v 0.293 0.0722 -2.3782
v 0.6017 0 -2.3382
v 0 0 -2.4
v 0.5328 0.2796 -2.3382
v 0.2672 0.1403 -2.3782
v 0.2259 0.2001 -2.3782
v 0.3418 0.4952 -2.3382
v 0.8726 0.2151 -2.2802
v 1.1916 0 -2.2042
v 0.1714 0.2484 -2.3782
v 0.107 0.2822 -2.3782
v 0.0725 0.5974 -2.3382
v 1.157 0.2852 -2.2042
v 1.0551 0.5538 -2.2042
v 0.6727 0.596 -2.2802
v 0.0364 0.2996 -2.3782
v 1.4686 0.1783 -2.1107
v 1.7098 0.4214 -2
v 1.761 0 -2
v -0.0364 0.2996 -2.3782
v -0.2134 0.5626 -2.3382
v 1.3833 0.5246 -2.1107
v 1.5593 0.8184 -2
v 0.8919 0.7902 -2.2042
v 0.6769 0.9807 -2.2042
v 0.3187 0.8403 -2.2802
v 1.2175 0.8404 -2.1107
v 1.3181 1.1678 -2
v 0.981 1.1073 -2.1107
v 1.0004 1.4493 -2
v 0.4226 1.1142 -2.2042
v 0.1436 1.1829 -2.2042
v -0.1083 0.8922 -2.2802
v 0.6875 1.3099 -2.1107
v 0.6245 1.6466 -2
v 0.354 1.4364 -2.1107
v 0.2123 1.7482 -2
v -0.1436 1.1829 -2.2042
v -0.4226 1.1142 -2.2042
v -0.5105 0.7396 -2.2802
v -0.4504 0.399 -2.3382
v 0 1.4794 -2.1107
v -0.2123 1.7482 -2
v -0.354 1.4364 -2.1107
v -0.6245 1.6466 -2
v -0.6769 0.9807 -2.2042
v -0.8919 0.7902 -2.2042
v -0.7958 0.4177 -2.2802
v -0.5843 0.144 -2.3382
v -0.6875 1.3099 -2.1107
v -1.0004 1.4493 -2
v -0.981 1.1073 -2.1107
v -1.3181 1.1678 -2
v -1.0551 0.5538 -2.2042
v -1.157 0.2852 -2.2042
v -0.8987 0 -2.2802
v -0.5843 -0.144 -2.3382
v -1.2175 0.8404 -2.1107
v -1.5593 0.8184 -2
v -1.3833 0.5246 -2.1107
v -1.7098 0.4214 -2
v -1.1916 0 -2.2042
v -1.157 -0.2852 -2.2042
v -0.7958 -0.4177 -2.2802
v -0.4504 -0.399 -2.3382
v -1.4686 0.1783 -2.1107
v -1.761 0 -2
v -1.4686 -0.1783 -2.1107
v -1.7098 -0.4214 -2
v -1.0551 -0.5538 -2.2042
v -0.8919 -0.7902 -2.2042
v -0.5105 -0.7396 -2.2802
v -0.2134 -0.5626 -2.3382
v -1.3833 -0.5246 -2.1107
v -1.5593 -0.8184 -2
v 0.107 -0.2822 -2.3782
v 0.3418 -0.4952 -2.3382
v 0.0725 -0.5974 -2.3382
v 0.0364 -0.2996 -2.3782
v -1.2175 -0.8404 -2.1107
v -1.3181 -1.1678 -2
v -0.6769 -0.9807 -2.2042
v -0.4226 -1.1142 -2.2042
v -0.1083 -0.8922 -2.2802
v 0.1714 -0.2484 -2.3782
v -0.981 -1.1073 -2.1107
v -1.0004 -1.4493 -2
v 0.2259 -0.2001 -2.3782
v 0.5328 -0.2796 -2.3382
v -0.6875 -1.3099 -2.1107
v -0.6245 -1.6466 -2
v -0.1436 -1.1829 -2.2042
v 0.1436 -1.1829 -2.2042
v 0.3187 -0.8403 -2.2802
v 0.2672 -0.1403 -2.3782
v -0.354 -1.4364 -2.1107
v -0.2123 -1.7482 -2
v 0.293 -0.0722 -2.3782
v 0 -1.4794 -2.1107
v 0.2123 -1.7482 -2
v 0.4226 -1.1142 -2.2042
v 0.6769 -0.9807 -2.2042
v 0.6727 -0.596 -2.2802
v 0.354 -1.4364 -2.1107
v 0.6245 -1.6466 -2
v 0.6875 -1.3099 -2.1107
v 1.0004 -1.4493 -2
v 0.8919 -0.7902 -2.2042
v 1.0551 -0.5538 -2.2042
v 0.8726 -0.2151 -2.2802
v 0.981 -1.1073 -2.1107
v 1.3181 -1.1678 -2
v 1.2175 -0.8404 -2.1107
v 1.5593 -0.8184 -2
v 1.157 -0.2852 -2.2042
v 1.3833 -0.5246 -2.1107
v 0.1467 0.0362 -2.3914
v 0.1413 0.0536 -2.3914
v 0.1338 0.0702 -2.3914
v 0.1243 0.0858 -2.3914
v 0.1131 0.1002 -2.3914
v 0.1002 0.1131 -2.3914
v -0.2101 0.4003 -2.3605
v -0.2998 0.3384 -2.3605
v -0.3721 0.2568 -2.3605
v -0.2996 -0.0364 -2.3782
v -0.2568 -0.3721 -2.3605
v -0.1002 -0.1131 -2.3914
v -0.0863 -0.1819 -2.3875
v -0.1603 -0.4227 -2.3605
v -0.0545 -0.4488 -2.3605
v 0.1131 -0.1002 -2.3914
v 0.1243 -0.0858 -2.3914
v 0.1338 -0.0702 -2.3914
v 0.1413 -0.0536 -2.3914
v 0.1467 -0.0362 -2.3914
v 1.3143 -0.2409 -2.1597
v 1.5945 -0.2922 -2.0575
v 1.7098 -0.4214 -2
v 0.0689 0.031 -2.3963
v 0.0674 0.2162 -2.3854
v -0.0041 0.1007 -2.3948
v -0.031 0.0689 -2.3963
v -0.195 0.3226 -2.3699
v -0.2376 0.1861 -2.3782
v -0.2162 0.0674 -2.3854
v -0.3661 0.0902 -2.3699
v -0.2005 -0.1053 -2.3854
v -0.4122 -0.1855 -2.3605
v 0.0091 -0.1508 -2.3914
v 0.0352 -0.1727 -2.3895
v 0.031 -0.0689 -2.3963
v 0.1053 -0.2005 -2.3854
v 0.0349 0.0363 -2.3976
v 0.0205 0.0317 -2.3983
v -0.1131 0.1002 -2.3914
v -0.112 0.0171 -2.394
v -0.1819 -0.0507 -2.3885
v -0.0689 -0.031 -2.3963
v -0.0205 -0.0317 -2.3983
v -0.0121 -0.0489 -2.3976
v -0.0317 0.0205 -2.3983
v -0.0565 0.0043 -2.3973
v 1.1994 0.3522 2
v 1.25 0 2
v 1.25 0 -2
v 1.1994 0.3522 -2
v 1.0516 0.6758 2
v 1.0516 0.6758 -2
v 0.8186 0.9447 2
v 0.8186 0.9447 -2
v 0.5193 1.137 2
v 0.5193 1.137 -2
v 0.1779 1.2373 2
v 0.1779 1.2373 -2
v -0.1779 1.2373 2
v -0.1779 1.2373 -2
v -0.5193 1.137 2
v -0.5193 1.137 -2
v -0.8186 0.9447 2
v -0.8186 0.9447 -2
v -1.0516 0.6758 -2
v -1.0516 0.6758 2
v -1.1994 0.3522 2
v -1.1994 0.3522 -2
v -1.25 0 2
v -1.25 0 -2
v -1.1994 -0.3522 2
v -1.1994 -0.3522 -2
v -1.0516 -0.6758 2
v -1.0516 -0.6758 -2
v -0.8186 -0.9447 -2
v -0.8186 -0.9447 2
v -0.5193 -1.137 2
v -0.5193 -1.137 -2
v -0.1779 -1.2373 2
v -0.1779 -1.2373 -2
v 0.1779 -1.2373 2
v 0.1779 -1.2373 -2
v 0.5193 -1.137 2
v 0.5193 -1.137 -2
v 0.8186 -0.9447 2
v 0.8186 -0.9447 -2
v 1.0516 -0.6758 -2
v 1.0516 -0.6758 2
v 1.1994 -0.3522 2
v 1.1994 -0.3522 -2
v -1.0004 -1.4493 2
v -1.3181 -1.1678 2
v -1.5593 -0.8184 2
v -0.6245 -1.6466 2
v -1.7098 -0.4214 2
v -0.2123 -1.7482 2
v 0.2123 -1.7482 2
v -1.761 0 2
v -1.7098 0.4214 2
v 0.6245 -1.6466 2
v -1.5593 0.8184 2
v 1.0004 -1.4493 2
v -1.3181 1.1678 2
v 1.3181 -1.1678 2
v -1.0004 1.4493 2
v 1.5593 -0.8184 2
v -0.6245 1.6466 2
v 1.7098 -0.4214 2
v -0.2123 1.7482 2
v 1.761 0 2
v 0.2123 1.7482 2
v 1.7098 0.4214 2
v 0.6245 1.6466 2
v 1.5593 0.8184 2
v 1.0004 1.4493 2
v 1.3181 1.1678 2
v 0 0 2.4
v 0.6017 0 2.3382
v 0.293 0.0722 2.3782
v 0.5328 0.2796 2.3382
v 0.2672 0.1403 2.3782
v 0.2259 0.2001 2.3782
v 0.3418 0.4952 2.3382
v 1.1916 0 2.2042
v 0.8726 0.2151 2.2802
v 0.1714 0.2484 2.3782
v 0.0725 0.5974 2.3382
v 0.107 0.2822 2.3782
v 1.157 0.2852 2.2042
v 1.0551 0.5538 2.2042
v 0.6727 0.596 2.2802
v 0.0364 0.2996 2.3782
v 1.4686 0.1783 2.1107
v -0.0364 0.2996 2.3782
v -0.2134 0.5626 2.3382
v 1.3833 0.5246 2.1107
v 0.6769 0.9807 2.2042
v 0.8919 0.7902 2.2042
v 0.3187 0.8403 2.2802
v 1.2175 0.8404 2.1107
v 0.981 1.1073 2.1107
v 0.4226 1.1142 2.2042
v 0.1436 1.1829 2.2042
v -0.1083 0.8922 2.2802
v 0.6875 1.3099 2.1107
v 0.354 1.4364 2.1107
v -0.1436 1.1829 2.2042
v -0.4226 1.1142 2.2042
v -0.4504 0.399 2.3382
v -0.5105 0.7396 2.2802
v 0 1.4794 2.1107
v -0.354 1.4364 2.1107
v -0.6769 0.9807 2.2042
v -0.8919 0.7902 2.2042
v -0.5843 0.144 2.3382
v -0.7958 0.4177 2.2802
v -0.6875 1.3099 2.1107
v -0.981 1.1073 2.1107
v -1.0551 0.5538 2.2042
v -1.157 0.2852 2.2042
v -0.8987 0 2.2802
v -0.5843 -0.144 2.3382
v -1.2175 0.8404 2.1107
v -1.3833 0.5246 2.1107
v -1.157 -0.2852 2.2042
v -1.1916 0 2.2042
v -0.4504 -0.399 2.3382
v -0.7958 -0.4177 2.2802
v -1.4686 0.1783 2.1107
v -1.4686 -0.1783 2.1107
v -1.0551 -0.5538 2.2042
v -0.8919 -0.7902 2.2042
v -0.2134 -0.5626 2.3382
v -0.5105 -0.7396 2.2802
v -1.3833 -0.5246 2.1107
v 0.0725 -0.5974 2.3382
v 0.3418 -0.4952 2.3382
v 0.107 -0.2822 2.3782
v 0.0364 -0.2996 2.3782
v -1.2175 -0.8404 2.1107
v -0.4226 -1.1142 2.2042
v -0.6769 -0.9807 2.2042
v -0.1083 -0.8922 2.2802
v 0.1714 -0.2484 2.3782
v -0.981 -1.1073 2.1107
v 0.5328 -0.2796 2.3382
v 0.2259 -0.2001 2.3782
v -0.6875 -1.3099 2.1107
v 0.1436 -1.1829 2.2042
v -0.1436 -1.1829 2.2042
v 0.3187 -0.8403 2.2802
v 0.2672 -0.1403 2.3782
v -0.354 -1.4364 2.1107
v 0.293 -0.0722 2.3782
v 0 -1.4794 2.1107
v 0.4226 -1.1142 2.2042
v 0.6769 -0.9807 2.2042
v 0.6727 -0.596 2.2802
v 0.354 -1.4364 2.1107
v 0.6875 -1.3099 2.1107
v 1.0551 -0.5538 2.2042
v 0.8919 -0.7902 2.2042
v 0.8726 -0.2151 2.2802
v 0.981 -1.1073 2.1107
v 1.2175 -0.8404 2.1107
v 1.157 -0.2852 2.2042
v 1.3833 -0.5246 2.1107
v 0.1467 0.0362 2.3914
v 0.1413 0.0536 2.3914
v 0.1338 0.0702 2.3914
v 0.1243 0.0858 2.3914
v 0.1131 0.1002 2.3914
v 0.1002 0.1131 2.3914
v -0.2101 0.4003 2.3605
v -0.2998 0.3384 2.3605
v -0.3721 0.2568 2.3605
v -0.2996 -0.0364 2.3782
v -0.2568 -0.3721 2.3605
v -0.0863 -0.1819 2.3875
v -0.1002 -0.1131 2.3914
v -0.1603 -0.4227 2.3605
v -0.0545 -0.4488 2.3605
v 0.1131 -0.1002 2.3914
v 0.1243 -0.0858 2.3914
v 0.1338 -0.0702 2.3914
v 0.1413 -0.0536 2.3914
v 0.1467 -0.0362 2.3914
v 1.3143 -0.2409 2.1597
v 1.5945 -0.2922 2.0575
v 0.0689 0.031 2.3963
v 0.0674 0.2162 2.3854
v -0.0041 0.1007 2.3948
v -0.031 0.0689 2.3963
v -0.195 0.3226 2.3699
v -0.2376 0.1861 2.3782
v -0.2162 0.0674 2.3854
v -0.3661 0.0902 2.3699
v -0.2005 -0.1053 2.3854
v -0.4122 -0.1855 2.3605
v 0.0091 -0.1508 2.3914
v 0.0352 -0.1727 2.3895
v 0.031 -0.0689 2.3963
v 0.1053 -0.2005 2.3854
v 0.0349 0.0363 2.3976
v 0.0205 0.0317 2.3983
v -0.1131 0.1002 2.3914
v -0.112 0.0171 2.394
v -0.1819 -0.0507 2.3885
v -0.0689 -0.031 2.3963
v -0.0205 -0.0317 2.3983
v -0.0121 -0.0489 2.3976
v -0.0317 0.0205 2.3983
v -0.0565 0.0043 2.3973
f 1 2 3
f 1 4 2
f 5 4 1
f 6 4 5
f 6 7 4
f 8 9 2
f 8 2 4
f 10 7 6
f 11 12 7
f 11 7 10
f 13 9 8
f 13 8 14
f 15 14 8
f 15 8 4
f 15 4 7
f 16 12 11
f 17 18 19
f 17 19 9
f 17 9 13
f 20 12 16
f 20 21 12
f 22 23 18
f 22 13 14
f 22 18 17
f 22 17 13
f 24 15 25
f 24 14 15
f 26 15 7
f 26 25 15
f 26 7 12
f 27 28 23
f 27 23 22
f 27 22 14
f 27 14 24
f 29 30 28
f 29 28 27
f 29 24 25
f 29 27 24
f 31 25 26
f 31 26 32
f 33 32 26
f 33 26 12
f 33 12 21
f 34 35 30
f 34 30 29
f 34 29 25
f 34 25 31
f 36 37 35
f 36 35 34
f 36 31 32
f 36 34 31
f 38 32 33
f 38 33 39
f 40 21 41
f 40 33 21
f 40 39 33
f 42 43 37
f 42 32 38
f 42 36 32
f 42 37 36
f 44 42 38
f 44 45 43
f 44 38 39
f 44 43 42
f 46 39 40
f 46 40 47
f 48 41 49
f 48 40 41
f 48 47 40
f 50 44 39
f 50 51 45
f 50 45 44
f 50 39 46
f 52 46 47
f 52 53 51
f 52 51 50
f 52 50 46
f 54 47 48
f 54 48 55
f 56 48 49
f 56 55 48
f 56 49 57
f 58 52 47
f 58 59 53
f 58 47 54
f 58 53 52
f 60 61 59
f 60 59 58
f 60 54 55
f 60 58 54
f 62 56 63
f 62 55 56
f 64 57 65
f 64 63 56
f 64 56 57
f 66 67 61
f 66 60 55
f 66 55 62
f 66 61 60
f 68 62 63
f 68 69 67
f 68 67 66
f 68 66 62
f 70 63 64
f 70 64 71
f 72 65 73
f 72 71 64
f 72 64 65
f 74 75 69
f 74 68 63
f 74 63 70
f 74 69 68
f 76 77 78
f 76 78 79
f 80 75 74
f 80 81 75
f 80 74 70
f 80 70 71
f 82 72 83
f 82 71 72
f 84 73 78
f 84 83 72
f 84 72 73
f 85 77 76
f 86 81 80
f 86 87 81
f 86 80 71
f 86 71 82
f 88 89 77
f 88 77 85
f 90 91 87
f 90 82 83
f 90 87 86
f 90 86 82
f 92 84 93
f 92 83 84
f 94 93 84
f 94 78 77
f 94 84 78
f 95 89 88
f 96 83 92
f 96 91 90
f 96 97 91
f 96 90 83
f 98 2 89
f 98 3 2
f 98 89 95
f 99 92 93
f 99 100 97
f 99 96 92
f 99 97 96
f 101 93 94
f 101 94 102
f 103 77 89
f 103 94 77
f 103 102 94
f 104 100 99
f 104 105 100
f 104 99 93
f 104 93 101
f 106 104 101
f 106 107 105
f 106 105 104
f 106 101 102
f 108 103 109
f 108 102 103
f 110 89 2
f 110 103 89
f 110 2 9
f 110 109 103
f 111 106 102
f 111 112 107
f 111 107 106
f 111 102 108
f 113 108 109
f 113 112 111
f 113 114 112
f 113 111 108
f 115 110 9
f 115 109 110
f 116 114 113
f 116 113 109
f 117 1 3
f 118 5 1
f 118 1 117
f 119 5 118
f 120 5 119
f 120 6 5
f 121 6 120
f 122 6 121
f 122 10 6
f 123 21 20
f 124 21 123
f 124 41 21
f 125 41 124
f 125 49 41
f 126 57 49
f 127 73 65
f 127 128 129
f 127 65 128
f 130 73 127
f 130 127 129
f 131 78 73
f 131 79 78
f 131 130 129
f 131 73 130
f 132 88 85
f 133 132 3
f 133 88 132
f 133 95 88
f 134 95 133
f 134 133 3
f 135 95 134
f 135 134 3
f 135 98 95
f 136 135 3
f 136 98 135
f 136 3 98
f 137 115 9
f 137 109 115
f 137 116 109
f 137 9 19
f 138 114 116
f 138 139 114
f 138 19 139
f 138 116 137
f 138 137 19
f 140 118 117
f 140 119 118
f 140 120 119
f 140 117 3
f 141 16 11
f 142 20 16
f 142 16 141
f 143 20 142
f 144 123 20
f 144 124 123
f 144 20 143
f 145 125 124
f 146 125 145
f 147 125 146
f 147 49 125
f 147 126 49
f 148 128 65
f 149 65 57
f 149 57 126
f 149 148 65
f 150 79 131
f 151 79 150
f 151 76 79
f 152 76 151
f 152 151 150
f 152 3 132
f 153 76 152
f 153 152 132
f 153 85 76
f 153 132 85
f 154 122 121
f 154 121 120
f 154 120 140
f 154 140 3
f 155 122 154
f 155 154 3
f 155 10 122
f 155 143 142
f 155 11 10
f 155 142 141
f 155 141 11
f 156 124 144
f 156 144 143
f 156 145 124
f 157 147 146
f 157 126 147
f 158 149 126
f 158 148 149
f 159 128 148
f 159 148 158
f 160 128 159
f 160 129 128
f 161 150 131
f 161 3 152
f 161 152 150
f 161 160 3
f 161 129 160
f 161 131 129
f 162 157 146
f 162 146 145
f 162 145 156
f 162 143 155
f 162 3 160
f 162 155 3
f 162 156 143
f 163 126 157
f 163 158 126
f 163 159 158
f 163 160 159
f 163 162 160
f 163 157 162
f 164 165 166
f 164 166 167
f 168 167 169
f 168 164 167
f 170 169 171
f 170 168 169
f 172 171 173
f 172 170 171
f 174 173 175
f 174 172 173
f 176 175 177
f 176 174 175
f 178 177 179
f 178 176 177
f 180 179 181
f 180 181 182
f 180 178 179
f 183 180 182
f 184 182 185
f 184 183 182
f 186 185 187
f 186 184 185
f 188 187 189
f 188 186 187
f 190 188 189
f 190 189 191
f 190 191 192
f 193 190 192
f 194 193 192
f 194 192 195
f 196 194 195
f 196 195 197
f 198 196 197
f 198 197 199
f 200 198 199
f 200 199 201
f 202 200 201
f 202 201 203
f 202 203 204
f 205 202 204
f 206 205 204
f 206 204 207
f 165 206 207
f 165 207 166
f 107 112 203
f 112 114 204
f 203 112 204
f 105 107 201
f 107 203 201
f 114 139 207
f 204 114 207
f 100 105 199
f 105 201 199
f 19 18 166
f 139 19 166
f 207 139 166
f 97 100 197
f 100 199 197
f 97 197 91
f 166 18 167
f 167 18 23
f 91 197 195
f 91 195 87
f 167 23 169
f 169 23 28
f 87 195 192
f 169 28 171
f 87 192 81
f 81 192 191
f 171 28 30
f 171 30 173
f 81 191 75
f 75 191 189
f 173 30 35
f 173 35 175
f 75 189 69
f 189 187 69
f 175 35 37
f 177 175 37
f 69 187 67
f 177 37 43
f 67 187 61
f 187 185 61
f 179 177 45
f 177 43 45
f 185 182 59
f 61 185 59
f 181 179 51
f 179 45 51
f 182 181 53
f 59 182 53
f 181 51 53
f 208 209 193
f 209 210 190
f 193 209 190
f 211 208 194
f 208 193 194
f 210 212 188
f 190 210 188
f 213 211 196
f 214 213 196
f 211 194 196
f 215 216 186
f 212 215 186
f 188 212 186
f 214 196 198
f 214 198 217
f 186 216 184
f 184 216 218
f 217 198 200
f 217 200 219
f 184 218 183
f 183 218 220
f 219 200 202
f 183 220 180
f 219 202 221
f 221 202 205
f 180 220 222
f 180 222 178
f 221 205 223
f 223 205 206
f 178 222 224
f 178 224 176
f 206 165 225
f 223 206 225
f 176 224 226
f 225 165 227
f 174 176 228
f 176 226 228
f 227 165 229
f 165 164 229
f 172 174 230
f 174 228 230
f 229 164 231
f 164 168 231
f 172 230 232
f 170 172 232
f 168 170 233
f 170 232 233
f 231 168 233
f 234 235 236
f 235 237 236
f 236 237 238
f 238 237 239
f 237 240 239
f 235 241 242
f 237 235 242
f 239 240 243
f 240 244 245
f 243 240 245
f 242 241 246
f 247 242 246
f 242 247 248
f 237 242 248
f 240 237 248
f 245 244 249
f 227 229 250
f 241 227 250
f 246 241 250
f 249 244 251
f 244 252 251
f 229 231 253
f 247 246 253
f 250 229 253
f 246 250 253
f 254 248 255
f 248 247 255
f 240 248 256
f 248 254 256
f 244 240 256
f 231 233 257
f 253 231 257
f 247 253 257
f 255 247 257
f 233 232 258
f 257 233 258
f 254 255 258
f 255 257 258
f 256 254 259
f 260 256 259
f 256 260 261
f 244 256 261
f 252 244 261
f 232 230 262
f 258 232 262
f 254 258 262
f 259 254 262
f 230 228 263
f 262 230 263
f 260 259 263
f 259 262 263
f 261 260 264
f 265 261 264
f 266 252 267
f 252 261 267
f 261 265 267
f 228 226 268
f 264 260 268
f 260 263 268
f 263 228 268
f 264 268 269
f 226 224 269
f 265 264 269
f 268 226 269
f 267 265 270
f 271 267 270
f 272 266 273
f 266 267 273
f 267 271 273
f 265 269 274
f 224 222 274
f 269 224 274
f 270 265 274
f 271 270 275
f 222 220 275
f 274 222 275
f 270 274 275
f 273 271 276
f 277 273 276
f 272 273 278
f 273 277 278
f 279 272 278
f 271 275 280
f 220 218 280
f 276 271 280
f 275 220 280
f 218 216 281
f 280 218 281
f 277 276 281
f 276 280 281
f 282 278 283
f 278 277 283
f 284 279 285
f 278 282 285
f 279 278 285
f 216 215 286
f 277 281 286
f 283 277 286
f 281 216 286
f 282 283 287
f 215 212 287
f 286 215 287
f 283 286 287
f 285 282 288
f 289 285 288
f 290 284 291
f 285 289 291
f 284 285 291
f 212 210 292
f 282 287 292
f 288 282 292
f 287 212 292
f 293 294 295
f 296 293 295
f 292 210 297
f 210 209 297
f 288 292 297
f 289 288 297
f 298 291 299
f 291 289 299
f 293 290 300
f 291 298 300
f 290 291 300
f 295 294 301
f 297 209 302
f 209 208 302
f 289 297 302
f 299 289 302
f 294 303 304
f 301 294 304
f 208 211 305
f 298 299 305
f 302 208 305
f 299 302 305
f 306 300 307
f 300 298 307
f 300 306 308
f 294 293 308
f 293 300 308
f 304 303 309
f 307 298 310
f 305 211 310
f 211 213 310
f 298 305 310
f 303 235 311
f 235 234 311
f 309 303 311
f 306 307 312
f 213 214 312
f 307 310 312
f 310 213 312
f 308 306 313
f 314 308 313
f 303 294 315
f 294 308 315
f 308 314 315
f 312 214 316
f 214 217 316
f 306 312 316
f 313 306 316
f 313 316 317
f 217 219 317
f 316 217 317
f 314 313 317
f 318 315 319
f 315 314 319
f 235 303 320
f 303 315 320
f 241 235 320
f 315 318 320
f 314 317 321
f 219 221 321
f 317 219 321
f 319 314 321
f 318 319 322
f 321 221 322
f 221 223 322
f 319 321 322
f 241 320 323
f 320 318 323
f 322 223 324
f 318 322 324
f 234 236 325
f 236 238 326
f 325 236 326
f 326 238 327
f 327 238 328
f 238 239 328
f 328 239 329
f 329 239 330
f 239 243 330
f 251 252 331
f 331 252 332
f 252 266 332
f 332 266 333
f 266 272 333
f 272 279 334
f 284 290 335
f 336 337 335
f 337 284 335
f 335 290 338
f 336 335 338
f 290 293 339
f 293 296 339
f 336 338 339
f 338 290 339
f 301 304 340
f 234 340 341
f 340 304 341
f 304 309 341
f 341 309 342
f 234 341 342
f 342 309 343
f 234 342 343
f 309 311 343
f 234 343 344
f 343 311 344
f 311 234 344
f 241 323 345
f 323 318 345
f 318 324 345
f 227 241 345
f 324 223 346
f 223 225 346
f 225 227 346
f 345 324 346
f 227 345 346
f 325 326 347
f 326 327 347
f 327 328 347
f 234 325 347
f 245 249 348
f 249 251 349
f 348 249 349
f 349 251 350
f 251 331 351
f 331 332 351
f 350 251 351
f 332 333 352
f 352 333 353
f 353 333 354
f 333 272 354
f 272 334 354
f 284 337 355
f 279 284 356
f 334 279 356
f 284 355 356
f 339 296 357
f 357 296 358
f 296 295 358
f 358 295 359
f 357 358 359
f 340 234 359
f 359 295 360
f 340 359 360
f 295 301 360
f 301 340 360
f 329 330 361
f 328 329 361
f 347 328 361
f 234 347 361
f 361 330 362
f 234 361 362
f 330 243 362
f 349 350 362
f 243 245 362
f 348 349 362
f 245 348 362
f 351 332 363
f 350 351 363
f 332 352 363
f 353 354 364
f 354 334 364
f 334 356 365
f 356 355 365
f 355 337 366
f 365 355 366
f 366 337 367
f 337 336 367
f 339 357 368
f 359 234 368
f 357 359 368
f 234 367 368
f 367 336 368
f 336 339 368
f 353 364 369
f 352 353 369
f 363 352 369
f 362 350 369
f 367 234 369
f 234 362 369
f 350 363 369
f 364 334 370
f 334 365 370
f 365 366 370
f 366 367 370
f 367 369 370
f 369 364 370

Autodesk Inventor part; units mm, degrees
ref_plane "YZ Plane" through (0, 0, 0) normal (1, 0, 0) x (0, 1, 0)
ref_plane "XZ Plane" through (0, 0, 0) normal (0, 1, 0) x (-1, 0, 0)
ref_plane "XY Plane" through (0, 0, 0) normal (0, 0, 1) x (1, 0, 0)
sketch "Sketch2" plane through (0, 0, 0) normal (0, 0, 1) x (1, 0, 0)
  circle A0 centre (0, 0) radius 1.25
  dimension "d44" = 2.5
extrude "Extrusion8" add sketch "Sketch2" along normal mid plane 4
sketch "Sketch3" plane through (0, 0, 2) normal (0, 0, 1) x (1, 0, 0)
  circle A0 centre (0, 0) radius 1.75
  dimension "d47" = 3.5
sketch "Sketch4" plane through (0, 0, 0) normal (0, 1, 0) x (-1, 0, 0)
  line L0 (1.25, 2) -> (-1.25, 2) projected
  line L1 (0, 2) -> (0, 2.4)
  arc A0 (0, 2.4) -> (-1.761, 2) centre (0.2088, -2.5956) ccw
  line L2 (0, 2) -> (-1.761, 2)
  point P0 (0, 0)
  dimension "d48" = 0.4
  dimension "d49" = 5
revolve "Revolution1" add sketch "Sketch4" angle 360 about axis through (0, 0, 2) along (0, 0, 1)
mirror "Mirror1" about plane through (0, 0, 0) normal (0, 0, 1) of "Revolution1"
properties part number "link7" material "Aluminum 6061"
